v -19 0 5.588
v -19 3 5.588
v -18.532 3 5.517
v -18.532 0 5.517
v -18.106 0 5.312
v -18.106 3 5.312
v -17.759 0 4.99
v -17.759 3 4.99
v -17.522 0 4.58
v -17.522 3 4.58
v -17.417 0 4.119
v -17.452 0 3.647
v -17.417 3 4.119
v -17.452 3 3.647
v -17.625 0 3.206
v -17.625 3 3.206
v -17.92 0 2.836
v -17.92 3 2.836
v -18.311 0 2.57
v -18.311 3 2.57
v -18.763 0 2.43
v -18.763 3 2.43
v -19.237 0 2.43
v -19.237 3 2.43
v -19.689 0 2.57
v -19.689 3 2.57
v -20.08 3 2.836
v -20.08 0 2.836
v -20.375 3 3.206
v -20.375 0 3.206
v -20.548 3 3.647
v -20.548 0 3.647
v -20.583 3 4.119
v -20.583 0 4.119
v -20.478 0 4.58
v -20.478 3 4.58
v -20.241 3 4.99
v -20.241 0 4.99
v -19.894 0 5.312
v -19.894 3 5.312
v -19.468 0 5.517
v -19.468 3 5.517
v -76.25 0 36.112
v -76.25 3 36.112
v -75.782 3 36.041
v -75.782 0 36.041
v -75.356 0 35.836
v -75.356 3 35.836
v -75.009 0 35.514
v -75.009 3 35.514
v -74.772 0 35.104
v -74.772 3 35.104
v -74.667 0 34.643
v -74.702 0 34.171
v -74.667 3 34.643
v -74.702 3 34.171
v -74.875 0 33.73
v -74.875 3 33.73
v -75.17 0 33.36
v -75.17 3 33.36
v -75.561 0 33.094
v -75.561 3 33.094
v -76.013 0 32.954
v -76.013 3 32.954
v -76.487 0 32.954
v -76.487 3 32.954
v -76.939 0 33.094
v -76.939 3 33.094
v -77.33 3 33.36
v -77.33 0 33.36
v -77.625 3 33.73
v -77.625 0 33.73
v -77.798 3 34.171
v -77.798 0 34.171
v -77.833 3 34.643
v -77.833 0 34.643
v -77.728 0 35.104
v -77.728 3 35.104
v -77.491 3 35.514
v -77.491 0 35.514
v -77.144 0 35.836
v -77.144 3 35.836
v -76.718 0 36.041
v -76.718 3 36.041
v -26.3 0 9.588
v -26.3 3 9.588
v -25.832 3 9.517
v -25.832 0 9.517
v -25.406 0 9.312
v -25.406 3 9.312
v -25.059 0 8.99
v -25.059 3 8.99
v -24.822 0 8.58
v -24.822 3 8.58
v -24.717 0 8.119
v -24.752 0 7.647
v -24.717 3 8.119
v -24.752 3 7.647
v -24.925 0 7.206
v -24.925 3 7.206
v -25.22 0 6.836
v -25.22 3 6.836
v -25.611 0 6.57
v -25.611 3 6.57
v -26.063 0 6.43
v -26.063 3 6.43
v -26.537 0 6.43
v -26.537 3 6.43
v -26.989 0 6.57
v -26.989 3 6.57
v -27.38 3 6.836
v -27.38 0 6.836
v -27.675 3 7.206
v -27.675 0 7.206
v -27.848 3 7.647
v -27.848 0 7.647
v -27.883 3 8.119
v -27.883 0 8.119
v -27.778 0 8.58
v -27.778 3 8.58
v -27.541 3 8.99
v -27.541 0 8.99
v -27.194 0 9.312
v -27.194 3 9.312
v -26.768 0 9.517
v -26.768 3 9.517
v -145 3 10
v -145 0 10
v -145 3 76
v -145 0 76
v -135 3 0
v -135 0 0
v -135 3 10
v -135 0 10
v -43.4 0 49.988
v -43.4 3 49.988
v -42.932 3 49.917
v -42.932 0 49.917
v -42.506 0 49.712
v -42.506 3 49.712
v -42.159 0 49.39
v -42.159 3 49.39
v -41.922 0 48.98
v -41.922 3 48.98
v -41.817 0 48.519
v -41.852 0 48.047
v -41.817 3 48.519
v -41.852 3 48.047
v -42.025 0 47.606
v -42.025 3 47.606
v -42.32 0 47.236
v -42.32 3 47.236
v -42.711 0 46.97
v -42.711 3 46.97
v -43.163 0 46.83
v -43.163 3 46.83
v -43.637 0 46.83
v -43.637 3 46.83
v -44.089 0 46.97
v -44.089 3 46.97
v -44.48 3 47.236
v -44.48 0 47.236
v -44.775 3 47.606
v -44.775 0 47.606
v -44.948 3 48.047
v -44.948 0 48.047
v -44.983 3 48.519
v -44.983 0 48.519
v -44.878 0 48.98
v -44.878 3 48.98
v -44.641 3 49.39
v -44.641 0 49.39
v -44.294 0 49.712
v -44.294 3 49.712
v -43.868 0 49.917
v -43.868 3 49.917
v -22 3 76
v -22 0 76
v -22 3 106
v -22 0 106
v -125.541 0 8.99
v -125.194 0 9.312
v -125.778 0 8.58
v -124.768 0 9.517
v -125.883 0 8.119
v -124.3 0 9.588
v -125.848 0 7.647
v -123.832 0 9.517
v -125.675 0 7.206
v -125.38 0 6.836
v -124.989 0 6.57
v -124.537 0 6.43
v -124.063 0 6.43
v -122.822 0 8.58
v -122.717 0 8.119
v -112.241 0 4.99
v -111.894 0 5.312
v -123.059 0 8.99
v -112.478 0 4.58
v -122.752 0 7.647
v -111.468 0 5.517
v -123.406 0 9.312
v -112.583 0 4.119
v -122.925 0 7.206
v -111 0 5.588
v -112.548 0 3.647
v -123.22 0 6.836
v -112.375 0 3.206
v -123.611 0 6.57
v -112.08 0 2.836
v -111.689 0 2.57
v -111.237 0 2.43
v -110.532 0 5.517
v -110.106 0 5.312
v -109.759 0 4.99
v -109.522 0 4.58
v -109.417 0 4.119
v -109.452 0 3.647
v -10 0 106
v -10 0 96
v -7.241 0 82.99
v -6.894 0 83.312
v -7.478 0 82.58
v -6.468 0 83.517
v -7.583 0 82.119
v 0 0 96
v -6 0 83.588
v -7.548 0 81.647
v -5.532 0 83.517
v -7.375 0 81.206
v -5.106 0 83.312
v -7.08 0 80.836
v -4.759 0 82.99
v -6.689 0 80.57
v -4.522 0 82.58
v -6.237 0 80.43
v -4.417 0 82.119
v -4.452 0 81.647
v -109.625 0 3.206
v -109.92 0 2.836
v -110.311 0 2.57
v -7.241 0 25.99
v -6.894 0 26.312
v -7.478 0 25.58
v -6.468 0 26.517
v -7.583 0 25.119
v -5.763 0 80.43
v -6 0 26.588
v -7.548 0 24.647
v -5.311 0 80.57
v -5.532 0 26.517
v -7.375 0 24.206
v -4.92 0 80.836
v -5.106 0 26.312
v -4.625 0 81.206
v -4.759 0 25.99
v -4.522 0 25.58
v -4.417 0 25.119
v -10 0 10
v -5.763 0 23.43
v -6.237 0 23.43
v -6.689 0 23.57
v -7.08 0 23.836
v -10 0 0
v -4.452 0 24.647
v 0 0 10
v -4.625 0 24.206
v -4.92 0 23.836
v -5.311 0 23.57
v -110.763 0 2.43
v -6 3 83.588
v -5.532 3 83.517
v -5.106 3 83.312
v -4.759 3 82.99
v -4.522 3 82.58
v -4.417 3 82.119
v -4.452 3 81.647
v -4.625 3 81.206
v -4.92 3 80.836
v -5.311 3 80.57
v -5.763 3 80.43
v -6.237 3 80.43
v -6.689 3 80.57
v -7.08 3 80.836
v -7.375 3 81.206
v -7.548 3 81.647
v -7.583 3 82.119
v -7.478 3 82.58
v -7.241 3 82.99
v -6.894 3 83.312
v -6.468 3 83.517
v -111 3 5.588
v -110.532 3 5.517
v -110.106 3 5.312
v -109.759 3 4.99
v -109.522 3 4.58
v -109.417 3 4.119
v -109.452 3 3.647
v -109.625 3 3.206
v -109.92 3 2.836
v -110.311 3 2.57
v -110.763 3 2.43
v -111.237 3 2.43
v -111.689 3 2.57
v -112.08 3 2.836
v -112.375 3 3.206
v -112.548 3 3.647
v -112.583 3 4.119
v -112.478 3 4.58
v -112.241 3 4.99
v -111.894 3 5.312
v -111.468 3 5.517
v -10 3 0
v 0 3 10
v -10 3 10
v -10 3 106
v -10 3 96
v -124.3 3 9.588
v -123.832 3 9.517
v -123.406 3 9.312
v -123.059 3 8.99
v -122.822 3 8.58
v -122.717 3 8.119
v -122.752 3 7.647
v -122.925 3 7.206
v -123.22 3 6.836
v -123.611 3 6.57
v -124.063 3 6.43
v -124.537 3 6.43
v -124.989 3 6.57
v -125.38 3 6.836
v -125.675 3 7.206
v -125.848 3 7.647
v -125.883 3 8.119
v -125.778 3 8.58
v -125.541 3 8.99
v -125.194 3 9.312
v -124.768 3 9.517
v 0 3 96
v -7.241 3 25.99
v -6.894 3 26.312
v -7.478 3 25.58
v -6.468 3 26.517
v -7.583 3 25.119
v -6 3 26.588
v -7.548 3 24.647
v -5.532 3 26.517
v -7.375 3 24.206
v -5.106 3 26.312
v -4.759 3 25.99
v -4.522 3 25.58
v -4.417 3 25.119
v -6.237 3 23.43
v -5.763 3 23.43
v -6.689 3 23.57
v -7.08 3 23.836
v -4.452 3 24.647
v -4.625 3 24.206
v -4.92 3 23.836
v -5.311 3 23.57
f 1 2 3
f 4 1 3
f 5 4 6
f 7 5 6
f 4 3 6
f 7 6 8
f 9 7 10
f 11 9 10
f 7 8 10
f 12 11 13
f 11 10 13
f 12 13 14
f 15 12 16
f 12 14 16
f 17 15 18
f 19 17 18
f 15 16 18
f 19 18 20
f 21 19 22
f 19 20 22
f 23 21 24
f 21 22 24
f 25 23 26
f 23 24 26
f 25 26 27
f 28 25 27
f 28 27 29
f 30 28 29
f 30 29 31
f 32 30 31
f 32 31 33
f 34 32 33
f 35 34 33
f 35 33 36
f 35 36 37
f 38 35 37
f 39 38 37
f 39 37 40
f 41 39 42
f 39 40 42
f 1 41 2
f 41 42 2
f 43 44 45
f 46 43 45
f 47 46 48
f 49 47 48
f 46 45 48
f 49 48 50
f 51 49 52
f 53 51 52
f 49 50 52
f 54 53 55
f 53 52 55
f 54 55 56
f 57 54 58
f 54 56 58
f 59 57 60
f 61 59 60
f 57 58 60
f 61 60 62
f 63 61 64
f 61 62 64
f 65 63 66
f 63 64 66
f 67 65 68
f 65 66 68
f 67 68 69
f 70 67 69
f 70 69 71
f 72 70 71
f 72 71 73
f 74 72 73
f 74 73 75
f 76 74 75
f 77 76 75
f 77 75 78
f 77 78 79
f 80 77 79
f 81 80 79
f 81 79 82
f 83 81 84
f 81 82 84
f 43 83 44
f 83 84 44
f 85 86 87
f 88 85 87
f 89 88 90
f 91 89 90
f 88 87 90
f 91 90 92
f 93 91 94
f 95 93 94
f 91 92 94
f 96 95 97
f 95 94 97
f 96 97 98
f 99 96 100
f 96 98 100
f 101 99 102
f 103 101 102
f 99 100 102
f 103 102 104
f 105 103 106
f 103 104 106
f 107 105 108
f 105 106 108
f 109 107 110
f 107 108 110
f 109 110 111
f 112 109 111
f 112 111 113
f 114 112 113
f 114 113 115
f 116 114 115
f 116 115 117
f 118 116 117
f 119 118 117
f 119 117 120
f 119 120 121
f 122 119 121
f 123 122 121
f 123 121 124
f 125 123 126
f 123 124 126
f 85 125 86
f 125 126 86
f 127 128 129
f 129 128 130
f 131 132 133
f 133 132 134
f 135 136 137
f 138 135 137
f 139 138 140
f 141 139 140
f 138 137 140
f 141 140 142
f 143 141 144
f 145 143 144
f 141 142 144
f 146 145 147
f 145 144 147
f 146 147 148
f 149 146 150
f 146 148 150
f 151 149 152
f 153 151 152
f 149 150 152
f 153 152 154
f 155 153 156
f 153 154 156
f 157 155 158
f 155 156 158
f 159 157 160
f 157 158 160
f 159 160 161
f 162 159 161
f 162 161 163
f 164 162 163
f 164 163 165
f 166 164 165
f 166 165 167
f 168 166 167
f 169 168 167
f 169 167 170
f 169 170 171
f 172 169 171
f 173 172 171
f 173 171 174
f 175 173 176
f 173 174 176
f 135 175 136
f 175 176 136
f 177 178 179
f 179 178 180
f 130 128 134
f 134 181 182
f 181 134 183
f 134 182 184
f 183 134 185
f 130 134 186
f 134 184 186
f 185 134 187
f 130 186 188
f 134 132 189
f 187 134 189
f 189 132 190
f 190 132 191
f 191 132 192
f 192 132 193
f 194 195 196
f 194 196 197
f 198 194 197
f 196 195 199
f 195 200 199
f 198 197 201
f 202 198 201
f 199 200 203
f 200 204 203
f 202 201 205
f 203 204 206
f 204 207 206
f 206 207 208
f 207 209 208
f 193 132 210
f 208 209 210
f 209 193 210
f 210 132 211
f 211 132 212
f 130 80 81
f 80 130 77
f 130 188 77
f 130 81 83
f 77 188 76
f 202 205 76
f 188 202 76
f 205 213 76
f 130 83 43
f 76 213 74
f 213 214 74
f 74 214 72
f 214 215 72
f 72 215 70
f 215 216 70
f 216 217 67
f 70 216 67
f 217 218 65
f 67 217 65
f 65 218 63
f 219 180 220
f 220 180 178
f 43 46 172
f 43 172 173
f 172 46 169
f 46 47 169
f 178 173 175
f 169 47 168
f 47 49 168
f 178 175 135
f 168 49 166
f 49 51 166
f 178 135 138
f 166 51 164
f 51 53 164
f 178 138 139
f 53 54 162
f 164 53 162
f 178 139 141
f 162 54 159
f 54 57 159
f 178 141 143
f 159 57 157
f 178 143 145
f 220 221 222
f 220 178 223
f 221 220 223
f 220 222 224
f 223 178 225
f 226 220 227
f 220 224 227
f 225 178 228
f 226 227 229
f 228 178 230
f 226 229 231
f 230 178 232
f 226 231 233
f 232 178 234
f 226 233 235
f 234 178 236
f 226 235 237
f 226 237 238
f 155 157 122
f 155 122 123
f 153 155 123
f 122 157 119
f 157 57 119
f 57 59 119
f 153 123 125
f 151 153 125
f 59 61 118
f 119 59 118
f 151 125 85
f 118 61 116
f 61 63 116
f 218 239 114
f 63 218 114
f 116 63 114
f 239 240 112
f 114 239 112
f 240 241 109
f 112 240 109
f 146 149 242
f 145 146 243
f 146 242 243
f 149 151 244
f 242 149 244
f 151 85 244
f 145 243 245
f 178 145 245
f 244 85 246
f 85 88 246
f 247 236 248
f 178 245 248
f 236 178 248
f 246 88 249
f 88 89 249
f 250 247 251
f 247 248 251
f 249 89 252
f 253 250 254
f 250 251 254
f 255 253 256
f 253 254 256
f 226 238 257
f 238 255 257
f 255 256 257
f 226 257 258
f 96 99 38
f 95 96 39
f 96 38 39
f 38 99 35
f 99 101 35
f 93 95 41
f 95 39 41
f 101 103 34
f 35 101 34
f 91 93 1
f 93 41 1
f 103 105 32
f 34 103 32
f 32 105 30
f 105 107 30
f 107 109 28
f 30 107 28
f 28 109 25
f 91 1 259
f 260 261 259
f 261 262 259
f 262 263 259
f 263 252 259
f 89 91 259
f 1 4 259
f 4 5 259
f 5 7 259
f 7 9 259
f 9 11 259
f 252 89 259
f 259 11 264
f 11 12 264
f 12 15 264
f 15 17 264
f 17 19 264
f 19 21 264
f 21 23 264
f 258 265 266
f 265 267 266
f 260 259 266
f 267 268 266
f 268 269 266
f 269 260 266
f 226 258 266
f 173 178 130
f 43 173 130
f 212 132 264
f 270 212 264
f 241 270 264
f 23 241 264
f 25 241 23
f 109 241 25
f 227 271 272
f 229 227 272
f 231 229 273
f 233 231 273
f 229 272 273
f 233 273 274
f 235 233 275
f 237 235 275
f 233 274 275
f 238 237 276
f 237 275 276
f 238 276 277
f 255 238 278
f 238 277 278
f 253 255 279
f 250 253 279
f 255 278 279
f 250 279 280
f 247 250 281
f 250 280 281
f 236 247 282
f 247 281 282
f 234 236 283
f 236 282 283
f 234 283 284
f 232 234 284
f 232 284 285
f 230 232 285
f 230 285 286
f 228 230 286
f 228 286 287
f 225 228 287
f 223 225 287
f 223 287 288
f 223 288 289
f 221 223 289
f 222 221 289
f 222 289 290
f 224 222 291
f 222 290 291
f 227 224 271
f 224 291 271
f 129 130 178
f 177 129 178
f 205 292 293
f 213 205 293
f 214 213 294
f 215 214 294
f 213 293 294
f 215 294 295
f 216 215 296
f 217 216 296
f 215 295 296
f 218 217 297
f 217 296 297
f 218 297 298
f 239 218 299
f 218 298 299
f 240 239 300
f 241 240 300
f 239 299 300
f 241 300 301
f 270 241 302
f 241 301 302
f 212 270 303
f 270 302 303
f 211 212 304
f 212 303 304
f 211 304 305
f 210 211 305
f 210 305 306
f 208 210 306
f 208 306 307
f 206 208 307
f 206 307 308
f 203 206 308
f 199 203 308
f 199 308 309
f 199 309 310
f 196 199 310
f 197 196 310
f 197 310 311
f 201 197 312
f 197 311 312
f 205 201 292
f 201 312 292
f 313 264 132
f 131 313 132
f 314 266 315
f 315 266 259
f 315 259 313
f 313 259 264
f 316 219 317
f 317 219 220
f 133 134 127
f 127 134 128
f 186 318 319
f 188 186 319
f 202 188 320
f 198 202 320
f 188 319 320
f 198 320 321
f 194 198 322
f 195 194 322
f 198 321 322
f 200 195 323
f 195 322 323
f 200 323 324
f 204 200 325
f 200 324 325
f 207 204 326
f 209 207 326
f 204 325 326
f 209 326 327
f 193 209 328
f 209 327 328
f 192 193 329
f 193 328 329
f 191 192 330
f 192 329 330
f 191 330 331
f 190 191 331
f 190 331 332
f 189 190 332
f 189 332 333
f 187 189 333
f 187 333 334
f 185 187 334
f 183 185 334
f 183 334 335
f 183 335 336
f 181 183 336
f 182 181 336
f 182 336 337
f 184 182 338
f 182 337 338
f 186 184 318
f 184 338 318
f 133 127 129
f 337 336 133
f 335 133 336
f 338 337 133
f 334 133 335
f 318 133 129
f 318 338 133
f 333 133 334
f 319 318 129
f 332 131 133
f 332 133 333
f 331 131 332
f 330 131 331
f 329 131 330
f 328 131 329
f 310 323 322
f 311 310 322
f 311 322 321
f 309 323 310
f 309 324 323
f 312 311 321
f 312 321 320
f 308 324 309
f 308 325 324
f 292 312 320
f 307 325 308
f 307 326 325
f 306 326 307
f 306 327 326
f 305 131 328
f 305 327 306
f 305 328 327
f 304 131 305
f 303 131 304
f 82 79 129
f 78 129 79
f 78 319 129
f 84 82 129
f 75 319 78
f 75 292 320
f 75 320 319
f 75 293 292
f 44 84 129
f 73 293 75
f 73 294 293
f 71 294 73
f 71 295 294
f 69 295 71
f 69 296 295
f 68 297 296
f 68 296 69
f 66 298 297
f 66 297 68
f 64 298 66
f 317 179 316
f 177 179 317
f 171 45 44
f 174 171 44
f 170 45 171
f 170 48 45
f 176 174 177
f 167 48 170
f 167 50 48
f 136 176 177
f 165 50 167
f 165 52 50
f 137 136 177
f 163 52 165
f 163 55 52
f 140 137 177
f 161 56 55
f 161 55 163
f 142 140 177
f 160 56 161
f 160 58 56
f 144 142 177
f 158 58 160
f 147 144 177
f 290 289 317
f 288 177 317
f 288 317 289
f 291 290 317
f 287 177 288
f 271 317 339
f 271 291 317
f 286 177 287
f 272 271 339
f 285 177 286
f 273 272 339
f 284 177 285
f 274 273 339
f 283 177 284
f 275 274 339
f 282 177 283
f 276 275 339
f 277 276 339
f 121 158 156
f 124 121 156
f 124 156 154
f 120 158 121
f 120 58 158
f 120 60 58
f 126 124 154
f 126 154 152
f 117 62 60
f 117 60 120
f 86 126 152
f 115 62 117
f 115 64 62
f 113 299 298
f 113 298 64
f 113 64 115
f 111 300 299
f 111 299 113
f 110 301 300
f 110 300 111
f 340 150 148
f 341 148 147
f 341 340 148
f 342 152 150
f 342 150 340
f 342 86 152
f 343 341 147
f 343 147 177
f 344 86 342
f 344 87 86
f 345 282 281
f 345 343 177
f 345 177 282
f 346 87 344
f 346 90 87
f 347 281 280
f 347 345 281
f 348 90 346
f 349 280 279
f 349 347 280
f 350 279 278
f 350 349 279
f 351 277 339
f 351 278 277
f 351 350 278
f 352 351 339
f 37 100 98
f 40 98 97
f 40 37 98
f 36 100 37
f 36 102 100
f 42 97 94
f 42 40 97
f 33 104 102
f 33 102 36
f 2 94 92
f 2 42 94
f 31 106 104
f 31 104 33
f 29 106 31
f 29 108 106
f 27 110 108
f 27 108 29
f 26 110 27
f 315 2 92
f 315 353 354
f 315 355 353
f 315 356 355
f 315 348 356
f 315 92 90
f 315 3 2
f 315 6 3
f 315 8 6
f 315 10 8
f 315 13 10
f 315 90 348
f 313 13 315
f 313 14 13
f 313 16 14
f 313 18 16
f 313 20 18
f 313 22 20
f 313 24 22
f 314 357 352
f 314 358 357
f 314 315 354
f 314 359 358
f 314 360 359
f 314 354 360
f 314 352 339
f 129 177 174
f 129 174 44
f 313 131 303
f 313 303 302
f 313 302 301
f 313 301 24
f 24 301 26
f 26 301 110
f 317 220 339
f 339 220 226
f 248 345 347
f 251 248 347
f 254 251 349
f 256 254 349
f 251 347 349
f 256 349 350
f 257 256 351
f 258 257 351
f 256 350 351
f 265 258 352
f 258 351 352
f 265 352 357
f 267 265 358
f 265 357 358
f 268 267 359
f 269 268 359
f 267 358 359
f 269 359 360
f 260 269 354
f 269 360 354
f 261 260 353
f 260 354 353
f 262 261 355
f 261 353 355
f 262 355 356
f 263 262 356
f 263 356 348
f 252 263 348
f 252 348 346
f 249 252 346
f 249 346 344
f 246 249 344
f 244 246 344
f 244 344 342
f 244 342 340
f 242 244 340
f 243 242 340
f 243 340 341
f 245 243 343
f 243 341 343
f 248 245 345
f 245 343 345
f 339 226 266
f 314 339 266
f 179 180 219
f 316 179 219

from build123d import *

# Parameters (mm, degrees)
EXTRUDE1_DEPTH     = 3
SKETCH2_R          = 1.5875
EXTRUDE2_DEPTH     = 3
SKETCH3_R          = 1.5875
EXTRUDE3_DEPTH     = 3
SKETCH5_R          = 1.5875
CUT_EXTRUDE1_DEPTH = 3


with BuildPart() as part:
    # Sketch1 → Extrude1 (new body)
    with BuildSketch(Plane(origin=(0, 0, 0), x_dir=(1, 0, 0), z_dir=(0, 1, 0))):
        Polygon((-145, -76), (-22, -76), (-22, -106), (-10, -106), (-10, -96), (0, -96), (0, -10), (-10, -10), (-10, 0), (-135, 0), (-135, -10), (-145, -10), align=None)
    extrude(amount=EXTRUDE1_DEPTH)

    # Sketch2 → Extrude2 (cut)
    with BuildSketch(Plane(origin=(0, 3, 0), x_dir=(1, 0, 0), z_dir=(0, 1, 0))):
        with Locations(Location((-6, -25, 0), (0, 0, 270))):
            Circle(SKETCH2_R)
        with Locations(Location((-6, -82, 0), (0, 0, 270))):
            Circle(SKETCH2_R)
        with Locations(Location((-26.3, -8, 0), (0, 0, 270))):
            Circle(SKETCH2_R)
        with Locations(Location((-124.3, -8, 0), (0, 0, 270))):
            Circle(SKETCH2_R)
    extrude(amount=-EXTRUDE2_DEPTH, mode=Mode.SUBTRACT)

    # Sketch3 → Extrude3 (cut)
    with BuildSketch(Plane(origin=(0, 3, 0), x_dir=(1, 0, 0), z_dir=(0, 1, 0))):
        with Locations(Location((-111, -4, 0), (0, 0, 270))):
            Circle(SKETCH3_R)
        with Locations(Location((-19, -4, 0), (0, 0, 270))):
            Circle(SKETCH3_R)
        with Locations(Location((-43.4, -48.4, 0), (0, 0, 270))):
            Circle(SKETCH3_R)
    extrude(amount=-EXTRUDE3_DEPTH, mode=Mode.SUBTRACT)

    # Sketch5 → Cut-Extrude1 (cut)
    with BuildSketch(Plane(origin=(0, 3, 0), x_dir=(1, 0, 0), z_dir=(0, 1, 0))):
        with Locations(Location((-76.25, -34.5240252, 0), (0, 0, 270))):
            Circle(SKETCH5_R)
    extrude(amount=-CUT_EXTRUDE1_DEPTH, mode=Mode.SUBTRACT)


solid = part.part
